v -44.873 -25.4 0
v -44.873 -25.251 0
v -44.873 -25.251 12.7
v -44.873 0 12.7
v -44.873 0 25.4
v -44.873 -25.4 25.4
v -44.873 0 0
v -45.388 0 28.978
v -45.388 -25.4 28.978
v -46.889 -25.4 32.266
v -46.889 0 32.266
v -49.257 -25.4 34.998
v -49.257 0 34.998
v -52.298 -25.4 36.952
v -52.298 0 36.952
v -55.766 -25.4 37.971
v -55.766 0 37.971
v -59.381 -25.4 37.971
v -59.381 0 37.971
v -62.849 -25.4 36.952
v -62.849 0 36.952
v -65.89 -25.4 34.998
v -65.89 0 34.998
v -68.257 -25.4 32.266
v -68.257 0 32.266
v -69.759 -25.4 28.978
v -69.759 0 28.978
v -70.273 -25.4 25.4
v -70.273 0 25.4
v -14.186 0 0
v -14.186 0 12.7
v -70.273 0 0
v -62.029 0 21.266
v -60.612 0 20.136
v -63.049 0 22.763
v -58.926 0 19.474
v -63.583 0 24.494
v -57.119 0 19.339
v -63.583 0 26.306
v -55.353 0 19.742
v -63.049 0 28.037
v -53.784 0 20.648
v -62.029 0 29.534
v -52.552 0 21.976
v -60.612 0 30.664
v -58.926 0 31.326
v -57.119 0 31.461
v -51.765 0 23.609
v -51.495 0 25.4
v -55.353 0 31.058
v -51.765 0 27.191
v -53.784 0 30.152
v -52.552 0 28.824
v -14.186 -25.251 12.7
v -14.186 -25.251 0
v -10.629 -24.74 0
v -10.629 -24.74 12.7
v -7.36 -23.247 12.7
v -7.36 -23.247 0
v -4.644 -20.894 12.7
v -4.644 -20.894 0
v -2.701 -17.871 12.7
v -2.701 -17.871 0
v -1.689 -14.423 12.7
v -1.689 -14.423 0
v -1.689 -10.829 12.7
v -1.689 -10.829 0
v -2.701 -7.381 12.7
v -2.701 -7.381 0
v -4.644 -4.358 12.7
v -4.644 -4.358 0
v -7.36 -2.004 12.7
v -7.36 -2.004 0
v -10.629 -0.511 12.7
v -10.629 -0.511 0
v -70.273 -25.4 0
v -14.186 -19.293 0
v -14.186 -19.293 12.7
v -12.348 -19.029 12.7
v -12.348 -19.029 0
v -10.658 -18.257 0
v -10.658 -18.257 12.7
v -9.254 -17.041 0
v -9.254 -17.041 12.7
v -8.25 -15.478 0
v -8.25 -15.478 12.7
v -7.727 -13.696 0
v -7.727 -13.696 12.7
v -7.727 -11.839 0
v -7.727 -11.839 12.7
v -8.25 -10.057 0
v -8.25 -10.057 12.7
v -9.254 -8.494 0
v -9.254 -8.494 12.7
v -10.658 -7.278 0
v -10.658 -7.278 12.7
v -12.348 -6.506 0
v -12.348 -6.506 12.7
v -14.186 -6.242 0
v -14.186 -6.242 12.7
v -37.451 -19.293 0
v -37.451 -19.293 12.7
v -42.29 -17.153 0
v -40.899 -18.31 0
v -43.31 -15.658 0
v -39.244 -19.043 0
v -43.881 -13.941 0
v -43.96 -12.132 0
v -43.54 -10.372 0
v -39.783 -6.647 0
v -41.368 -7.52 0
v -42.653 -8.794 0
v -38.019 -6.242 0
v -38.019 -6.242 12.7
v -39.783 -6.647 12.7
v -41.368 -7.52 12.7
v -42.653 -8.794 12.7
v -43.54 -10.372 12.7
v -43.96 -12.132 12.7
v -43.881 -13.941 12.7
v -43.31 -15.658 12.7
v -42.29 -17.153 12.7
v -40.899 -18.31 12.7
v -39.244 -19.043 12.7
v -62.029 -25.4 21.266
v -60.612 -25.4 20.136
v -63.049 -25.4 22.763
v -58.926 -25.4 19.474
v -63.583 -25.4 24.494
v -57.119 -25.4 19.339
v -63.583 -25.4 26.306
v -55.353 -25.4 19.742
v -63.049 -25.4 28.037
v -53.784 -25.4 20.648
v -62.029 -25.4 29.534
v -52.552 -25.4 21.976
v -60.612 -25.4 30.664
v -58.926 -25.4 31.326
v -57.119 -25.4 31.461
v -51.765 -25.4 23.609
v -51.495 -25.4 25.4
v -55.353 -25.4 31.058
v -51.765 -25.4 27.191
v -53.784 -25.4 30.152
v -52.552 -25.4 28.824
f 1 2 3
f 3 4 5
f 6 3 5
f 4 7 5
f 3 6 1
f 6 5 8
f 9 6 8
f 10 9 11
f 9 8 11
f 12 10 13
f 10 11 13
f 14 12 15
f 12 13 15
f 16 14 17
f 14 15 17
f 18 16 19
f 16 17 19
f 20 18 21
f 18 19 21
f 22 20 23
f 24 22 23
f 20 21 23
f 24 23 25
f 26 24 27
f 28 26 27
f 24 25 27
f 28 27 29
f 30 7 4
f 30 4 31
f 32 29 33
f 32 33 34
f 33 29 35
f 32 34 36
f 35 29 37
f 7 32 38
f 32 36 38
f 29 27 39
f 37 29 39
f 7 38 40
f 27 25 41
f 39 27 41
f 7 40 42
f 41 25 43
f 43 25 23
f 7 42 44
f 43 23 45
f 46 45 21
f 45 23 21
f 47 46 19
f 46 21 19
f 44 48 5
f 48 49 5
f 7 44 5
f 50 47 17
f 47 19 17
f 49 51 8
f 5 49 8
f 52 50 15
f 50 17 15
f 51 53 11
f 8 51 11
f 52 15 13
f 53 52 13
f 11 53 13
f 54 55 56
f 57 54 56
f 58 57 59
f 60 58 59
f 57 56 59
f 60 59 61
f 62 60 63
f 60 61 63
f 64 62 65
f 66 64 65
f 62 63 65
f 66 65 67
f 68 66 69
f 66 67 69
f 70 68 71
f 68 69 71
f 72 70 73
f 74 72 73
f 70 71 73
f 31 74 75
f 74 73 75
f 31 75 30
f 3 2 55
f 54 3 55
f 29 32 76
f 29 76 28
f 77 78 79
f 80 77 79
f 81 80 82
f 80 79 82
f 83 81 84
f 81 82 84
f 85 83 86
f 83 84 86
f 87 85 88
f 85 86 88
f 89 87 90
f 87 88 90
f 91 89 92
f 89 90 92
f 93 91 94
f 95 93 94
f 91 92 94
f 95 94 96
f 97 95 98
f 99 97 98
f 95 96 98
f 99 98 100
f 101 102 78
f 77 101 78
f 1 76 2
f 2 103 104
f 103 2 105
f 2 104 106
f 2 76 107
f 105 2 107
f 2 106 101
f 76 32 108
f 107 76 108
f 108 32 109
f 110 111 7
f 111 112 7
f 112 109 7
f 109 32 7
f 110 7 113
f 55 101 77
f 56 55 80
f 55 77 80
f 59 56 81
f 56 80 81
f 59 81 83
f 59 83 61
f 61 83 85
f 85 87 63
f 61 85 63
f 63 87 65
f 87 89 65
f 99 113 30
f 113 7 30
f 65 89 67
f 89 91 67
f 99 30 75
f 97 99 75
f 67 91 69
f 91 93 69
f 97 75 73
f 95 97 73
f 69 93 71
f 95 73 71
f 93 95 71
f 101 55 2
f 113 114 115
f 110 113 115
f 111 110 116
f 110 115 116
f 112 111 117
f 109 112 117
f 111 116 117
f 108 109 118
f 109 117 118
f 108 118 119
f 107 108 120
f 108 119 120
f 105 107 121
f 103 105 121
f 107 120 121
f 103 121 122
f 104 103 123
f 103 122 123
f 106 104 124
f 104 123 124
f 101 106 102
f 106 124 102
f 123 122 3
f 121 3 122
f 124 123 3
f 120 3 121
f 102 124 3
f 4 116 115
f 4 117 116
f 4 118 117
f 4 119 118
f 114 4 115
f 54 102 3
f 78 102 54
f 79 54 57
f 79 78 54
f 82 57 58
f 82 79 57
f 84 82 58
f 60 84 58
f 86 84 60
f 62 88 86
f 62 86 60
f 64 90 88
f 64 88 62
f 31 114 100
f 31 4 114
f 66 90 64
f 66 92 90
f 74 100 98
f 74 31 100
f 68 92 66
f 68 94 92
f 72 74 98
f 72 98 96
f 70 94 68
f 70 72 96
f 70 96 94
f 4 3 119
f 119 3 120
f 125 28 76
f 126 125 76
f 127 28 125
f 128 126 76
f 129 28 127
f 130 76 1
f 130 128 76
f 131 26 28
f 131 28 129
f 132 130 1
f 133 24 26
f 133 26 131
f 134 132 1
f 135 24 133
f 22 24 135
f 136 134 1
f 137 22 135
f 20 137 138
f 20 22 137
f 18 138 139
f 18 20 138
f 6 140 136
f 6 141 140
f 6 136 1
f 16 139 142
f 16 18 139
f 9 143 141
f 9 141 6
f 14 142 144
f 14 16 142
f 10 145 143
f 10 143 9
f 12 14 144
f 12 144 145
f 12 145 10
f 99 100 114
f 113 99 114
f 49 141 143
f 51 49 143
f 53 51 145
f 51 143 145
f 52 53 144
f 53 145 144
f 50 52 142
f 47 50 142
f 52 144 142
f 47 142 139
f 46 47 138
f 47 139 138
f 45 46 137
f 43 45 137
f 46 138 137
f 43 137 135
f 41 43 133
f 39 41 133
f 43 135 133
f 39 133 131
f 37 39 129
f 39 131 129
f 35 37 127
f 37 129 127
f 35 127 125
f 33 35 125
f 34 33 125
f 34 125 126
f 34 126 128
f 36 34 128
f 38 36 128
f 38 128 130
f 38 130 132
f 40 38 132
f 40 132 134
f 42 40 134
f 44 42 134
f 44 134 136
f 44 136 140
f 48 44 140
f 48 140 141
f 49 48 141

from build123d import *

# Parameters (mm, degrees)
F0_W      = 25.4
F0_H      = 25.4
F1_DEPTH  = 25.4
F2_W      = 31.493294
F2_H      = 25.251383
F3_DEPTH  = 12.7
F4_R      = 6.077907
F5_DEPTH  = 25.4
F5_FACE_R = 6.077907
F6_DEPTH  = 50.8
F8_DEPTH  = 12.7


with BuildPart() as f1:
    # F0 (on Front) → F1 (new body)
    with BuildSketch(Plane.XZ):
        with Locations((-57.573333, 12.7)):
            Rectangle(F0_W, F0_H)
        with BuildLine():
            ThreePointArc((-44.873333, 25.4), (-57.573333, 38.1), (-70.273333, 25.4))
            Line((-70.273333, 25.4), (-44.873333, 25.4))
        make_face()
    extrude(amount=F1_DEPTH)

    # F2 (on Top) → F3 (join)
    with BuildSketch(Plane.XY):
        with Locations((-29.932818, -12.625692)):
            Rectangle(F2_W, F2_H)
        with BuildLine():
            ThreePointArc((-14.186171, -25.251383), (-1.560479, -12.625691), (-14.186171, 0))
            Line((-14.186171, 0), (-14.186171, -25.251383))
        make_face()
    extrude(amount=F3_DEPTH)

    # F4 (on face) → F5 (join)
    with BuildSketch(Plane.XZ.offset(25.4)):
        with Locations((-57.573333, 25.4)):
            Circle(F4_R)
    extrude(amount=F5_DEPTH)

    # F5_face (on face) → F6 (cut)
    with BuildSketch(Plane(origin=(-57.573333, -50.8, 25.4), x_dir=(1, 0, 0), z_dir=(0, -1, 0))):
        Circle(F5_FACE_R)
    extrude(amount=-F6_DEPTH, mode=Mode.SUBTRACT)

    # F7 (on face) → F8 (cut)
    with BuildSketch(Plane.XY.offset(12.7)):
        with BuildLine():
            ThreePointArc((-14.186171, -19.293193), (-7.660532, -12.767554), (-14.186171, -6.241916))
            Line((-14.186171, -6.241916), (-38.018938, -6.241916))
            ThreePointArc((-38.018938, -6.241916), (-43.983294, -13.03921), (-37.451491, -19.293193))
            Line((-37.451491, -19.293193), (-14.186171, -19.293193))
        make_face()
    extrude(amount=-F8_DEPTH, mode=Mode.SUBTRACT)


solid = f1.part
